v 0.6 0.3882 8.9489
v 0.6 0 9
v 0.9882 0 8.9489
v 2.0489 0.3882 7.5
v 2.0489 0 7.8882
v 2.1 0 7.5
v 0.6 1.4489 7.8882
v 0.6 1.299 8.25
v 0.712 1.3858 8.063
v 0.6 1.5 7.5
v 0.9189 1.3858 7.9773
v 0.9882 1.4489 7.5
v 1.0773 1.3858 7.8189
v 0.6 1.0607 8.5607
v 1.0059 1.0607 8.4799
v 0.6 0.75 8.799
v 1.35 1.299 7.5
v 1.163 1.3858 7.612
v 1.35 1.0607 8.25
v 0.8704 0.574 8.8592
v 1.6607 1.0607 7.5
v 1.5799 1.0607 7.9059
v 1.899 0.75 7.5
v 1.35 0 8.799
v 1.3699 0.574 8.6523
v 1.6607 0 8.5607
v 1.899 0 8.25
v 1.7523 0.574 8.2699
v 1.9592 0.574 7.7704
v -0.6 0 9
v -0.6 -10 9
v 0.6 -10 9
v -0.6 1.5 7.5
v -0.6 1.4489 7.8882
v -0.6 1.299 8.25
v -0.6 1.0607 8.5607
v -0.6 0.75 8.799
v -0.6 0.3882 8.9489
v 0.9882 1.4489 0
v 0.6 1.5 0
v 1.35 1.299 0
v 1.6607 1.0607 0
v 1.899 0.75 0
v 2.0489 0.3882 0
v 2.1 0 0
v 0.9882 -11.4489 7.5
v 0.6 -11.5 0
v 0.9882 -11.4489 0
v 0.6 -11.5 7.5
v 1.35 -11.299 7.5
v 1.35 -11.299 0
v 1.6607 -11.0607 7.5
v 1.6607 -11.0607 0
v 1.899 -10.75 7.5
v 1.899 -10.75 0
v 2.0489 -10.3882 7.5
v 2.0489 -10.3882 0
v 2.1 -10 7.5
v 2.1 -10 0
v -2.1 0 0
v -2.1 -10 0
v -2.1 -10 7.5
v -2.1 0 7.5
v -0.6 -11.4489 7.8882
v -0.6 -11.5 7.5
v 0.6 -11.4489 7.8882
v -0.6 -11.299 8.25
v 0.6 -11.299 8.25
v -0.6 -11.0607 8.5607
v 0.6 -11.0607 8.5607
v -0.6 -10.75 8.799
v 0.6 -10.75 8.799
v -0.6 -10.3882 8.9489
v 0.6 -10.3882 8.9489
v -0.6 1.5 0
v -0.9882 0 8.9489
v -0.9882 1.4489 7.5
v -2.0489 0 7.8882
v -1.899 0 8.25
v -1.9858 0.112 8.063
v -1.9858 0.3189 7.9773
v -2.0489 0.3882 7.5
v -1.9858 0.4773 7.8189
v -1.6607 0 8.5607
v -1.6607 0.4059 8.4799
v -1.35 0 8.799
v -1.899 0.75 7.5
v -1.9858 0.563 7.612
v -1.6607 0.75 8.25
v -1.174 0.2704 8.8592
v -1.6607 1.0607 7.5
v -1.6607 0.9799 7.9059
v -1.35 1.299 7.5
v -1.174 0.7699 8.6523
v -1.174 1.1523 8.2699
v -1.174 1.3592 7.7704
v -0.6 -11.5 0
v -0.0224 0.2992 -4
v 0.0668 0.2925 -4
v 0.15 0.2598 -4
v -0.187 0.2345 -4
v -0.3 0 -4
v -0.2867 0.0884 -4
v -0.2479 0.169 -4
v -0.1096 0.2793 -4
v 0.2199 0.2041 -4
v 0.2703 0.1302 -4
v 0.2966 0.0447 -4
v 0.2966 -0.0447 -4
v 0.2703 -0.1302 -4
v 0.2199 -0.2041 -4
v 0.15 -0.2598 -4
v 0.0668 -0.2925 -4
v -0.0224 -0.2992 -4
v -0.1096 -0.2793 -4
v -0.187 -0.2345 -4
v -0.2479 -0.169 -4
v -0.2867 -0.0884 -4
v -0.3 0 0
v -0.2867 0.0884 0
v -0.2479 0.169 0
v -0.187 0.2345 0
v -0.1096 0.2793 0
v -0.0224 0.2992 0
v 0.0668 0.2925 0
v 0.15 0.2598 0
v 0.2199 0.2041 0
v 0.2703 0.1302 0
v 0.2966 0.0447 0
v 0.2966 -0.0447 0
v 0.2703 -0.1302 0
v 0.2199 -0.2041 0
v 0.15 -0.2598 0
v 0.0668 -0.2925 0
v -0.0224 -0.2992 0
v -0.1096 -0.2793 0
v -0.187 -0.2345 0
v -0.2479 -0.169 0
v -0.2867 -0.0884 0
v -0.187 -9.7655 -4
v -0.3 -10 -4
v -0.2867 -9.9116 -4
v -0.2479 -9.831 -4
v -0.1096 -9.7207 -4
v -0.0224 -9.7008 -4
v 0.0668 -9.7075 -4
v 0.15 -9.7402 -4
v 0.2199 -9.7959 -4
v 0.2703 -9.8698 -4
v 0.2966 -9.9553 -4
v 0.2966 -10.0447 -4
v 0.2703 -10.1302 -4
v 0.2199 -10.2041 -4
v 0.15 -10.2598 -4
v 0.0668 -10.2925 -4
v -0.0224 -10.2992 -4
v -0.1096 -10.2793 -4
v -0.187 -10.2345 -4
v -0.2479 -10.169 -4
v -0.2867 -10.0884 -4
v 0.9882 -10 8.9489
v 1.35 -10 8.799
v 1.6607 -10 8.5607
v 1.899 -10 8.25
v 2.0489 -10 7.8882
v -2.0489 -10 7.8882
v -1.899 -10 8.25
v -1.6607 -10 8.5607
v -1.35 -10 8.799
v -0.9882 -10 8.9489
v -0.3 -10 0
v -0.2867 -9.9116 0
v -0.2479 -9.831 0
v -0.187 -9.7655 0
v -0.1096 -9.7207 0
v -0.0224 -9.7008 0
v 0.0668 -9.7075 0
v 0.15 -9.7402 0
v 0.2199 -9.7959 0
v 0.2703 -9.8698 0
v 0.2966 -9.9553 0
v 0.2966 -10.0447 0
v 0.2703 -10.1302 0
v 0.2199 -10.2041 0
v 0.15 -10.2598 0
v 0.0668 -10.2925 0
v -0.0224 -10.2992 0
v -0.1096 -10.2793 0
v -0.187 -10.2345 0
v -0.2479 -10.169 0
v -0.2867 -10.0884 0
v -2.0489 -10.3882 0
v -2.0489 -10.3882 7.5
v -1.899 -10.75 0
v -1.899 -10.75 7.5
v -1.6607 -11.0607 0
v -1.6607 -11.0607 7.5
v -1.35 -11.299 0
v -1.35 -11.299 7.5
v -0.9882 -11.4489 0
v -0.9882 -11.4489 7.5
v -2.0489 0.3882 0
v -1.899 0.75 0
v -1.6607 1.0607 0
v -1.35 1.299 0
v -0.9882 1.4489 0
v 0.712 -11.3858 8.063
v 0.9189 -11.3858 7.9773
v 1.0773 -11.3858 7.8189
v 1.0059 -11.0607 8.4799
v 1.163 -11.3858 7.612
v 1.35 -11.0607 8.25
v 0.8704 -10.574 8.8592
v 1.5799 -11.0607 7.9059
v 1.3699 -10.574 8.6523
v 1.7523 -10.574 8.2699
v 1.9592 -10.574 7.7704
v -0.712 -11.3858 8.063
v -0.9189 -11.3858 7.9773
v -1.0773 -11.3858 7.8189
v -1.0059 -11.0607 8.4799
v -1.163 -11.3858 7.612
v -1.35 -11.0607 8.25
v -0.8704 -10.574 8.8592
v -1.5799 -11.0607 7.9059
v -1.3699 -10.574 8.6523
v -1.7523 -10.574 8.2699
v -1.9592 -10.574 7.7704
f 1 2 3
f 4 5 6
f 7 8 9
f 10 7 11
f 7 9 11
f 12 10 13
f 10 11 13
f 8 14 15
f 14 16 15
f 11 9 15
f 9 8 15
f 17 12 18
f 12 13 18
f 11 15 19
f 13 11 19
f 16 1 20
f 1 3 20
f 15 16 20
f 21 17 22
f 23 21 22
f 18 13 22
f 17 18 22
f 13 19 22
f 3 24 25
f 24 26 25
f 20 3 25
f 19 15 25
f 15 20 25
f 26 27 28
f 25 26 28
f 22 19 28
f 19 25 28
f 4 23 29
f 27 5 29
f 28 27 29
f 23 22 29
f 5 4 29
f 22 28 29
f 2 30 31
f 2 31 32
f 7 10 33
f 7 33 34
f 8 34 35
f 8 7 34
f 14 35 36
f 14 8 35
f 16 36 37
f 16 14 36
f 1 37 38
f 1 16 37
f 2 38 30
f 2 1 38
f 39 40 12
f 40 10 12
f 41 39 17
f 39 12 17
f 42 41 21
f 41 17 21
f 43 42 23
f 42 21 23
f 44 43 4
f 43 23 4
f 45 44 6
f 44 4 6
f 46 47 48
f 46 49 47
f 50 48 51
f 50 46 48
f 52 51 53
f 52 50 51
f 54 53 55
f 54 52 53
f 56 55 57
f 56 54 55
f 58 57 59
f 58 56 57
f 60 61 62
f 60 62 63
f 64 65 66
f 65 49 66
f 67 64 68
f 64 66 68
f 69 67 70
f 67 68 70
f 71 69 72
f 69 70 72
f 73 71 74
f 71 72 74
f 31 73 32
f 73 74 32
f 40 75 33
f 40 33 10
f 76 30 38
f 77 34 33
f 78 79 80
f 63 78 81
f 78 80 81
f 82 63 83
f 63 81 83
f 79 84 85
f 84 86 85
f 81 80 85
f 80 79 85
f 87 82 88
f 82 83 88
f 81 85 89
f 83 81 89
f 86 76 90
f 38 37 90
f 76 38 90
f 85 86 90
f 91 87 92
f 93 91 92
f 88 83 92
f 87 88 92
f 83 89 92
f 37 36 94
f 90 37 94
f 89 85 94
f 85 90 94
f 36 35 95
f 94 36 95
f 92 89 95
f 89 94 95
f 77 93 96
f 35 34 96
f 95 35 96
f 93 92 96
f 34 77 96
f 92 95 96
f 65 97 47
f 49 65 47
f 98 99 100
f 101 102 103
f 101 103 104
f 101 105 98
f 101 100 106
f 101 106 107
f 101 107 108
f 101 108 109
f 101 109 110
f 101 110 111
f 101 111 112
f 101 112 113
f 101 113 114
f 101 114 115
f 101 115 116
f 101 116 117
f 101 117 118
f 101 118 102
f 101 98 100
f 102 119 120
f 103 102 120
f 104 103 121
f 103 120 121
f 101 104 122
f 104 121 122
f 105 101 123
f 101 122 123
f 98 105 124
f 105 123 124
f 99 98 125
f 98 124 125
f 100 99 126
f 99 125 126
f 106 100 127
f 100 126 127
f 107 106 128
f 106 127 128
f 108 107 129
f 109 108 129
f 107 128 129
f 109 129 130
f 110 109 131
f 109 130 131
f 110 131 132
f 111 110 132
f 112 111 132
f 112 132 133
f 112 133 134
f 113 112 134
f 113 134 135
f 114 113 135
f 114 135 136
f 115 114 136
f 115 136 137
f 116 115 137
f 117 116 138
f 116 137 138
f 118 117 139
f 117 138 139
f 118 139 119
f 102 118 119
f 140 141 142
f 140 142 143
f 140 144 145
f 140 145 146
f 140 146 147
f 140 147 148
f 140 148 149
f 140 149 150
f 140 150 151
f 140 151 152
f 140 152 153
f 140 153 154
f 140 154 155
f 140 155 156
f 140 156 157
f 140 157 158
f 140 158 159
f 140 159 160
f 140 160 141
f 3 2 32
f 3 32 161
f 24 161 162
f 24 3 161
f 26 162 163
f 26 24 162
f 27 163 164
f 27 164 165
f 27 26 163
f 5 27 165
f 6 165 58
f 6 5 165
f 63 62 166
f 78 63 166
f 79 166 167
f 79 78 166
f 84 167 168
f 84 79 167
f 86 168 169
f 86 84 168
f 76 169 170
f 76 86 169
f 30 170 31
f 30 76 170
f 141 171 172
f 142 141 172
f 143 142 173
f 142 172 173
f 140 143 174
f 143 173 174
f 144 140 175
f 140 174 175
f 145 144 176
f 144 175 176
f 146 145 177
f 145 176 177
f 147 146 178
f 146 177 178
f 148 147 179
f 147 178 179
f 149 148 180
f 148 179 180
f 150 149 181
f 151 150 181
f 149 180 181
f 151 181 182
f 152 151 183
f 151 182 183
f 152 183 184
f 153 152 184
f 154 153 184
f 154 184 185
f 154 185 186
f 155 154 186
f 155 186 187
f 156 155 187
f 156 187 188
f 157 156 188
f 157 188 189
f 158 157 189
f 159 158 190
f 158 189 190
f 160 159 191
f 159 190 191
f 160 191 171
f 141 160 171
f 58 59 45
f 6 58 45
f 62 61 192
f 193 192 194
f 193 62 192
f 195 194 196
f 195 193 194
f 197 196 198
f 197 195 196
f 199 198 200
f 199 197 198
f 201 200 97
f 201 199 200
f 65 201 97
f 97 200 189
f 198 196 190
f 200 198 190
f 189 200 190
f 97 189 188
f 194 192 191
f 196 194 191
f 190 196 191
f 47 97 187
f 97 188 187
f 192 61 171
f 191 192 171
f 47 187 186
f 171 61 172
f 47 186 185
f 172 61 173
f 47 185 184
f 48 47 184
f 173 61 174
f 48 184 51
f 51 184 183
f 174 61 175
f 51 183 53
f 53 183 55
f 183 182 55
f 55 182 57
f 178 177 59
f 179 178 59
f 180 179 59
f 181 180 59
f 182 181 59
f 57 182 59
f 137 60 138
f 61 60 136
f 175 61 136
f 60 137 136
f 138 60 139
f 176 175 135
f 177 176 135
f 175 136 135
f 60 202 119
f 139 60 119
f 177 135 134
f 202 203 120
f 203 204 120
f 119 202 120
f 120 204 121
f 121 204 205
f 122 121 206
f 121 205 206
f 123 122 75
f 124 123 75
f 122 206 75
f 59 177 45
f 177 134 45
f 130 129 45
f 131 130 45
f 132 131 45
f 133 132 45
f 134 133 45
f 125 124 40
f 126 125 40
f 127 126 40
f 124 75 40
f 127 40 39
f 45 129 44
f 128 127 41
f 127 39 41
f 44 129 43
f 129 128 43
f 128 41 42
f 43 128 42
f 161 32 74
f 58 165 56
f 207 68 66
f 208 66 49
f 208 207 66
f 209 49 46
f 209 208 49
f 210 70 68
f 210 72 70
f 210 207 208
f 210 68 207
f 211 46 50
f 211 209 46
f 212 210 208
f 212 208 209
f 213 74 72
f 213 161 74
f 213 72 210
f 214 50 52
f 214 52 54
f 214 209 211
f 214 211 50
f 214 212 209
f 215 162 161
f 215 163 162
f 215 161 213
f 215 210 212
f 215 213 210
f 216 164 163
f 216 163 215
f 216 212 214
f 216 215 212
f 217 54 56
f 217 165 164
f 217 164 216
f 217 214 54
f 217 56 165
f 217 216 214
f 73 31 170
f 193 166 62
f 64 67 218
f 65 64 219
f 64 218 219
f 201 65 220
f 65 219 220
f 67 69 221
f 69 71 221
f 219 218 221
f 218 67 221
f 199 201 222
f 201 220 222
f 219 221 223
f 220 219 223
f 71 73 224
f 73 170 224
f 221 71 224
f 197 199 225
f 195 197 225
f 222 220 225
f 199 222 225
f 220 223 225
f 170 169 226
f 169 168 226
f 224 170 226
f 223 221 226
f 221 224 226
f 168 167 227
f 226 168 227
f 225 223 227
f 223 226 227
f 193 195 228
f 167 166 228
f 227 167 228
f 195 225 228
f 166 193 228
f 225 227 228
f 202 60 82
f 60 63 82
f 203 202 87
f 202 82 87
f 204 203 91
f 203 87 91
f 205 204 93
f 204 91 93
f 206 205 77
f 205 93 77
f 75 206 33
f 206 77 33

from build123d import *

# Parameters (mm, degrees)
SKETCH_2_W      = 4.2
SKETCH_2_H      = 13
EXTRUDE_1_DEPTH = 9
SKETCH_3_R      = 0.3
EXTRUDE_2_DEPTH = 4
FILLET_1_R      = 1.5


with BuildPart() as part:
    # Эскиз2 → Бобышка-Вытянуть1 (new body)
    with BuildSketch(Plane.XY):
        with Locations((0, -5)):
            Rectangle(SKETCH_2_W, SKETCH_2_H)
    extrude(amount=EXTRUDE_1_DEPTH)

    # Эскиз3 → Бобышка-Вытянуть2 (add)
    with BuildSketch(Plane(origin=(0, 0, 0), x_dir=(-1, 0, 0), z_dir=(0, 0, -1))):
        Circle(SKETCH_3_R)
        with Locations((0, -10)):
            Circle(SKETCH_3_R)
    extrude(amount=EXTRUDE_2_DEPTH)

    # Скругление1
    fillet_1_edges = [part.edges().sort_by_distance(p)[0] for p in [
        (2.1, -5, 9),
        (0, 1.5, 9),
        (-2.1, -5, 9),
        (0, -11.5, 9),
        (-2.1, 1.5, 4.5),
        (2.1, 1.5, 4.5),
        (2.1, -11.5, 4.5),
        (-2.1, -11.5, 4.5),
    ]]
    fillet(fillet_1_edges, radius=FILLET_1_R)


solid = part.part
